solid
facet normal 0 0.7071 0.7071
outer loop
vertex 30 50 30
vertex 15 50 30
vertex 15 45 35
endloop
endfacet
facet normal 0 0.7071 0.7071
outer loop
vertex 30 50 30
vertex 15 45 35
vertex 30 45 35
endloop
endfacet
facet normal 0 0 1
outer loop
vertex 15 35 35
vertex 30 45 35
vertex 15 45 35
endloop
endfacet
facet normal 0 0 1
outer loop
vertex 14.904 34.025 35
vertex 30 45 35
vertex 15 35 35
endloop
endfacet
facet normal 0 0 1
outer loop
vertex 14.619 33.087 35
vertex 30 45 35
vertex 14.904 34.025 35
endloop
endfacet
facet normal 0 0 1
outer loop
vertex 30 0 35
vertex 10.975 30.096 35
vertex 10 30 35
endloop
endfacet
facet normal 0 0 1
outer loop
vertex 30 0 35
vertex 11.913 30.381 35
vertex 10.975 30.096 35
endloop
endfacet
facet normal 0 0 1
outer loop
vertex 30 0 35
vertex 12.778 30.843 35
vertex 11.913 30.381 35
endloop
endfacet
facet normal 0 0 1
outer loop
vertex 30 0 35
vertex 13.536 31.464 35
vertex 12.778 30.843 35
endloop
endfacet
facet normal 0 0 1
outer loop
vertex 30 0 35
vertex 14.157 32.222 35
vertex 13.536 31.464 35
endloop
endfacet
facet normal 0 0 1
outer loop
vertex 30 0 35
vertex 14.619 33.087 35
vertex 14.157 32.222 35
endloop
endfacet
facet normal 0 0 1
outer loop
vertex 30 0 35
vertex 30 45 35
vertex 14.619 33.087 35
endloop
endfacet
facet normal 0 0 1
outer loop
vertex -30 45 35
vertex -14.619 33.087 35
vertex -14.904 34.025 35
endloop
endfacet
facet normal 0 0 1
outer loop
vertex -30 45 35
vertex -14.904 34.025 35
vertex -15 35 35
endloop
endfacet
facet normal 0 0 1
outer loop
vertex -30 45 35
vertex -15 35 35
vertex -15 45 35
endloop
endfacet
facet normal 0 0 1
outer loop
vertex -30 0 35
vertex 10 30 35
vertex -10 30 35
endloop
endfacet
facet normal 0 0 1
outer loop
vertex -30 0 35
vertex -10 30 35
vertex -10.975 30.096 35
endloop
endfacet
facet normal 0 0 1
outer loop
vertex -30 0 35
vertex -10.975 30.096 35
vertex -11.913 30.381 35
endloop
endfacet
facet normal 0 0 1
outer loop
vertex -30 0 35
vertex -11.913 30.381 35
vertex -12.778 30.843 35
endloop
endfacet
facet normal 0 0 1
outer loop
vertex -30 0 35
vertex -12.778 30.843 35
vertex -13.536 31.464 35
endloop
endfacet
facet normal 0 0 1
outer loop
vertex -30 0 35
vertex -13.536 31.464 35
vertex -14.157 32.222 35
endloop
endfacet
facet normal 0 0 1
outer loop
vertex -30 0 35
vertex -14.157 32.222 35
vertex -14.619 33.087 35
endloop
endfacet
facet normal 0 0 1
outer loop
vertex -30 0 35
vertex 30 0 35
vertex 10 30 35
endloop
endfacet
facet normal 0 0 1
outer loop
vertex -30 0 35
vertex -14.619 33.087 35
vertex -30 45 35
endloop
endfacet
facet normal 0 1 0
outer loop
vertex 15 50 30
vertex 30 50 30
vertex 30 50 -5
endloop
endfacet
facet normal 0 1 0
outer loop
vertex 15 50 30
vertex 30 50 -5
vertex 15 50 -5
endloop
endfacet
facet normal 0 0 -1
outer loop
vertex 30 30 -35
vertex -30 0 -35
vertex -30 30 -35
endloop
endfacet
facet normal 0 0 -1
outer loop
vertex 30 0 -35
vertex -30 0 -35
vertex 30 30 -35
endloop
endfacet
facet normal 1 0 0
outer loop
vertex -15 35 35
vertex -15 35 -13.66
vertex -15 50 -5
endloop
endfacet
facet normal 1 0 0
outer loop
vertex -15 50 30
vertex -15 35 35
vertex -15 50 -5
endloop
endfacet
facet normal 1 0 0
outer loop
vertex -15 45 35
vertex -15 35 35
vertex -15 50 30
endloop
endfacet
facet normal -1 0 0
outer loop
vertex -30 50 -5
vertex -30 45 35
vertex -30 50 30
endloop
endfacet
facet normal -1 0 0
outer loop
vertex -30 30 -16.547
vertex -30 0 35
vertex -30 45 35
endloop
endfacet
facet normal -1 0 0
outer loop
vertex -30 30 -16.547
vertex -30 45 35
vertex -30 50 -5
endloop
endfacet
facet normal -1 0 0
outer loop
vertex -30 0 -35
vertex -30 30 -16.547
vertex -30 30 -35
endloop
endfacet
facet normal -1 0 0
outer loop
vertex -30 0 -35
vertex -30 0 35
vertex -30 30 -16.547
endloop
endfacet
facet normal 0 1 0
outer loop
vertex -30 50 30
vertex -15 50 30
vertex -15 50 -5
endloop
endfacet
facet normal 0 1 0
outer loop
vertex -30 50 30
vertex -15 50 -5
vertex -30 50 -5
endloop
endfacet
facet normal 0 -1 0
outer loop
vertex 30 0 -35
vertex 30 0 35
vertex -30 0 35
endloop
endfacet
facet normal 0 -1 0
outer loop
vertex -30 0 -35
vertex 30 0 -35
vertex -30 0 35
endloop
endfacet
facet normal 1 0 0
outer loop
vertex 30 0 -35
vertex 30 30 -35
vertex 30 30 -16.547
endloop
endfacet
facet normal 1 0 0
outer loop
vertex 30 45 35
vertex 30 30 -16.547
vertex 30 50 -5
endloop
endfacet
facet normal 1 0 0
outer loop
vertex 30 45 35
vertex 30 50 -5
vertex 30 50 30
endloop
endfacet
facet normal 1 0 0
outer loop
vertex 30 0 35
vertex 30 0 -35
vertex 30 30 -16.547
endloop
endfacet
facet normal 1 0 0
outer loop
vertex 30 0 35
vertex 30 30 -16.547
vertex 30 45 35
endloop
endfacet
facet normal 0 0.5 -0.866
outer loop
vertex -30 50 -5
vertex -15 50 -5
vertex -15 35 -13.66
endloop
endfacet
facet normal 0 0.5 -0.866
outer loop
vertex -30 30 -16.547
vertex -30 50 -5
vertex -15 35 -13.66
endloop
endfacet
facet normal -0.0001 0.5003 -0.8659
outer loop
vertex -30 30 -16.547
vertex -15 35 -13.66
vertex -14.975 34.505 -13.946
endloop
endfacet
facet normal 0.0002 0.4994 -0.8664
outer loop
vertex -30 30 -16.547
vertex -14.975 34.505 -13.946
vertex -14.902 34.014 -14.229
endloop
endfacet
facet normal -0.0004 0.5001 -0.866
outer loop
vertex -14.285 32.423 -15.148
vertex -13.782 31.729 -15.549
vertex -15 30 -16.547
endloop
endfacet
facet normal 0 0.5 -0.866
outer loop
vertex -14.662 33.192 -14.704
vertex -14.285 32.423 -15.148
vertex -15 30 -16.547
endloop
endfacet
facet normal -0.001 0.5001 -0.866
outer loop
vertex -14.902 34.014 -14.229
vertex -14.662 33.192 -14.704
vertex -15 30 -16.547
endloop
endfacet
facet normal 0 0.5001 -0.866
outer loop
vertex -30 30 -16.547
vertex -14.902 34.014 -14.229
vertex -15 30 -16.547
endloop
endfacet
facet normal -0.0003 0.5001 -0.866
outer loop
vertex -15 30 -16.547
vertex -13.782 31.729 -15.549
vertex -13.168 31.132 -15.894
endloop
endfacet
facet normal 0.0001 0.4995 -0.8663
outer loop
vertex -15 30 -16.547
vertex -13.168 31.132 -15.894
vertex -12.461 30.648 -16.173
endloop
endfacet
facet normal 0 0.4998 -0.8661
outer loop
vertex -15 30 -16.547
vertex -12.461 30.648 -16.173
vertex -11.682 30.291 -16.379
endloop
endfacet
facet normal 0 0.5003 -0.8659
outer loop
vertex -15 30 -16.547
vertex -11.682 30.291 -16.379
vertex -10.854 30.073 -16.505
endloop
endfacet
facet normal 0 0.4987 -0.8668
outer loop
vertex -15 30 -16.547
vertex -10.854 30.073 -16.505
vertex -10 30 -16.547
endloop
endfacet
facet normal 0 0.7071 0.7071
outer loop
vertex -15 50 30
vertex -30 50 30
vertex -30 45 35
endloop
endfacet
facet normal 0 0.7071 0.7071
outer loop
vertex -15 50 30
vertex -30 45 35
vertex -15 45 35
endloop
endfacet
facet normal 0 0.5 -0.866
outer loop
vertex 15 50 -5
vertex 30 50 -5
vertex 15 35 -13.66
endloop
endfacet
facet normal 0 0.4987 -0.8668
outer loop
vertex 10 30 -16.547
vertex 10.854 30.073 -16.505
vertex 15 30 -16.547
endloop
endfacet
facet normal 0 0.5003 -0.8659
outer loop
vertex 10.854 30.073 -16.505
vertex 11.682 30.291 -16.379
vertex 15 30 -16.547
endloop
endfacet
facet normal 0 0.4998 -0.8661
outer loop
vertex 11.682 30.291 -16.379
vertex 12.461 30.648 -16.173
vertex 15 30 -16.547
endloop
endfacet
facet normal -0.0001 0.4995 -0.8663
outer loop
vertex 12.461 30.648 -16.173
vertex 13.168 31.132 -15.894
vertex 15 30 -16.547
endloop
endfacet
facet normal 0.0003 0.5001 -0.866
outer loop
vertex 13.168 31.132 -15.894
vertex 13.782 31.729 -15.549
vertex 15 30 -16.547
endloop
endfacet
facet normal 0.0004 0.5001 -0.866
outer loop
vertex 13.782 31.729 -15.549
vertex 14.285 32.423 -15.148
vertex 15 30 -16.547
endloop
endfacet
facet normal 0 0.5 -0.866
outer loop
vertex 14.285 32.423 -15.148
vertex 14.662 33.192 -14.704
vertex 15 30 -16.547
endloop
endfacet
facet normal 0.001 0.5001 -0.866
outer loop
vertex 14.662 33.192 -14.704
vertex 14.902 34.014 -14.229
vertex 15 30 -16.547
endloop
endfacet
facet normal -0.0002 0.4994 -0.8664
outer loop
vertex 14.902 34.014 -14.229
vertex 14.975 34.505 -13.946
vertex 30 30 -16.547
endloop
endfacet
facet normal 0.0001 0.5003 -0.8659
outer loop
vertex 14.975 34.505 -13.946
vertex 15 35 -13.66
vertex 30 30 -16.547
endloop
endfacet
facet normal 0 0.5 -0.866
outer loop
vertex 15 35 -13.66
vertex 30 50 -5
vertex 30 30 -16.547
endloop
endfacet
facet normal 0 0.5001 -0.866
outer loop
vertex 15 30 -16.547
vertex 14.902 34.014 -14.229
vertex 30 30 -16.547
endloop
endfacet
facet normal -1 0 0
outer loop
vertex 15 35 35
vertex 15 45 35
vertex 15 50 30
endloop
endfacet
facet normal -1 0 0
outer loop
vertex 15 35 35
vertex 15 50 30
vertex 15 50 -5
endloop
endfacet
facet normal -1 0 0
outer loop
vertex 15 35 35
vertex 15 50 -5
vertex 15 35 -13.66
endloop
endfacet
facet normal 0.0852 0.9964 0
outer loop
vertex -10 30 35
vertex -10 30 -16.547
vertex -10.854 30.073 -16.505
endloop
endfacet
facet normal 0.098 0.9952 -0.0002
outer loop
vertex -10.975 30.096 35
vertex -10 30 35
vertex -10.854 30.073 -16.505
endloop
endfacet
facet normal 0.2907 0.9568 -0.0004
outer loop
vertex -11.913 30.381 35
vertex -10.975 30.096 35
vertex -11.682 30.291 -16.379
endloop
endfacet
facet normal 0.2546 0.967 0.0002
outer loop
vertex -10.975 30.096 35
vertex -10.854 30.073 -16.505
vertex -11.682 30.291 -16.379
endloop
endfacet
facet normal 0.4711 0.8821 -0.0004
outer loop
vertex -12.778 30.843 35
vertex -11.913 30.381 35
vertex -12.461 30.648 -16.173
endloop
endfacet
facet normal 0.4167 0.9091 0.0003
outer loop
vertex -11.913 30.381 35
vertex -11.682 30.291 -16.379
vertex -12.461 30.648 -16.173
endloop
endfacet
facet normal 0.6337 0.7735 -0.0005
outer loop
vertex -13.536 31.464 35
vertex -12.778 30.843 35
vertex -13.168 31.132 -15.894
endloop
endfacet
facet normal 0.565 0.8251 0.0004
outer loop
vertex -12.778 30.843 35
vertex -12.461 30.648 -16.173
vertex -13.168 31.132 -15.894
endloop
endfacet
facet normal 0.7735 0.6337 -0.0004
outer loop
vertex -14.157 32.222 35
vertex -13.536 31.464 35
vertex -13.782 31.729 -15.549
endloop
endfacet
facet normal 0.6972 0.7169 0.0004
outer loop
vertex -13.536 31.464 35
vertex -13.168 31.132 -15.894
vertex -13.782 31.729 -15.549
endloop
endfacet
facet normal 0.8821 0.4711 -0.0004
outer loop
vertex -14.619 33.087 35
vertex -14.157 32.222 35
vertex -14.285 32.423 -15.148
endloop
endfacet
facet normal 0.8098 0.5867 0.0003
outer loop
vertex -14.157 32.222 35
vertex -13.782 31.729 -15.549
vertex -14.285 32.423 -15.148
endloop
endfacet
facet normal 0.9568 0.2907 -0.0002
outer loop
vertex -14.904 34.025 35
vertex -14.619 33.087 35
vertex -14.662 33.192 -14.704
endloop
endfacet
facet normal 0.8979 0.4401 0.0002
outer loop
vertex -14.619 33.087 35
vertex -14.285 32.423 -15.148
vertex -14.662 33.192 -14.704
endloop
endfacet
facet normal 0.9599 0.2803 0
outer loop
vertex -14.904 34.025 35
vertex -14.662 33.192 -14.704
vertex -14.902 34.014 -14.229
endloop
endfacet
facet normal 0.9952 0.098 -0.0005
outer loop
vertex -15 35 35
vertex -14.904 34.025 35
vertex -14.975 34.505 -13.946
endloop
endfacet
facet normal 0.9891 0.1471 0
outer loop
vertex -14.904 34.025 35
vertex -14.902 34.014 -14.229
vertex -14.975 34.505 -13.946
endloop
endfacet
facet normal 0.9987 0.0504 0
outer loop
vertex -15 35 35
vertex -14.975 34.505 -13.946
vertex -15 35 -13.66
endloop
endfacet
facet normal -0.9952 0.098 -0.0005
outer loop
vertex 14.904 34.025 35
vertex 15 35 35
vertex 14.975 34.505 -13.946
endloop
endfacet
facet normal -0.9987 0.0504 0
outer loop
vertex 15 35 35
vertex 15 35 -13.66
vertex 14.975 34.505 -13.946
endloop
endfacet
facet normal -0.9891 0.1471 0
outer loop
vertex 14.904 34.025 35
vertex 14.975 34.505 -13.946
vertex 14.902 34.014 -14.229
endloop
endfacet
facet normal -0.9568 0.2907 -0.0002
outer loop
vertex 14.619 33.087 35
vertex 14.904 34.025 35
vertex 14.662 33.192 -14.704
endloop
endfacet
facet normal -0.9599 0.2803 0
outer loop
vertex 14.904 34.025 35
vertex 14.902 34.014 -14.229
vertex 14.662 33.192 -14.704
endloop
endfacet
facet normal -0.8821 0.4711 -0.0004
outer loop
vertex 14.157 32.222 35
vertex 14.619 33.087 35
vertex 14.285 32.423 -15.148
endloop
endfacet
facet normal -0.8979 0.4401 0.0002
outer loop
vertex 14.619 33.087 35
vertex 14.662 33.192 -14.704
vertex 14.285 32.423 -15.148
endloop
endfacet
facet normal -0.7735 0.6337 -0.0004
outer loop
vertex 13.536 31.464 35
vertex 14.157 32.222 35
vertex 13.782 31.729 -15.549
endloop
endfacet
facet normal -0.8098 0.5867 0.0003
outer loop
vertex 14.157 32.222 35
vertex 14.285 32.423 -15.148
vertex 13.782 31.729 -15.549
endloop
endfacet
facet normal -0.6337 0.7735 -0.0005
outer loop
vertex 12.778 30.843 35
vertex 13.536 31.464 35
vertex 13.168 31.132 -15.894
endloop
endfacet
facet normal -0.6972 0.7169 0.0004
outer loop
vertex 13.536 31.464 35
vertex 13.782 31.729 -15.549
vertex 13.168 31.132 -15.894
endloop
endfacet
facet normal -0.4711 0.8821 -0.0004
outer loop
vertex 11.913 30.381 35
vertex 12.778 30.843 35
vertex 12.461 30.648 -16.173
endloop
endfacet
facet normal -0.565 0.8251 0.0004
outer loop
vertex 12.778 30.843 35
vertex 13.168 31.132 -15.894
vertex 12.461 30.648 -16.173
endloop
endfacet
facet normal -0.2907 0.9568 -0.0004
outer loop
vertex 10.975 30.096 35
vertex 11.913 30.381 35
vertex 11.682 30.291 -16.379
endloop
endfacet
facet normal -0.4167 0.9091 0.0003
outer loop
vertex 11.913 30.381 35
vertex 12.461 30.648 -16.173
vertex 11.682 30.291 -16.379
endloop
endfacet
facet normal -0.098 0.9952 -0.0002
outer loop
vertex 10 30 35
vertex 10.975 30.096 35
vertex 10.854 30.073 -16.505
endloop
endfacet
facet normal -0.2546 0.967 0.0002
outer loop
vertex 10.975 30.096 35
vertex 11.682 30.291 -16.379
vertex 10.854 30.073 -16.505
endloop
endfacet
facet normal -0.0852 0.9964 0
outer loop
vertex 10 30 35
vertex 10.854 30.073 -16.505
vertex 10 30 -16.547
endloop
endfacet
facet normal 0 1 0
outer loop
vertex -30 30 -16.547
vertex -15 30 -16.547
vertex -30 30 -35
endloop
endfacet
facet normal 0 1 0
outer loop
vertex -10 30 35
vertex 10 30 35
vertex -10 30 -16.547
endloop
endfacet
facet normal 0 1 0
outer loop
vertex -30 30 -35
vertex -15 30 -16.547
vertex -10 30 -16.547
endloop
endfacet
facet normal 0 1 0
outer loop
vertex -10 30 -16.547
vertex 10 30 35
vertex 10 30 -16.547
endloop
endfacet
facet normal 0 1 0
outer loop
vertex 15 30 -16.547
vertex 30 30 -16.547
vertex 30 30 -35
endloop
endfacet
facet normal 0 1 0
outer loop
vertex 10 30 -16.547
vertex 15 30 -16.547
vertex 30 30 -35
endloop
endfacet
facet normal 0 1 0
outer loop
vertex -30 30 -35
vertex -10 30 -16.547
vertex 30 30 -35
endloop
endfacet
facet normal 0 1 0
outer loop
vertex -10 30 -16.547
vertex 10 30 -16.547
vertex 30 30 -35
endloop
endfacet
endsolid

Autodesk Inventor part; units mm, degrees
ref_plane "YZ Plane" through (0, 0, 0) normal (1, 0, 0) x (0, 1, 0)
ref_plane "XZ Plane" through (0, 0, 0) normal (0, 1, 0) x (-1, 0, 0)
ref_plane "XY Plane" through (0, 0, 0) normal (0, 0, 1) x (1, 0, 0)
sketch "Esboço1" plane through (0, 0, 0) normal (0, 1, 0) x (-1, 0, 0)
  line L0 (30, -35) -> (-30, -35)
  line L1 (-30, -35) -> (-30, 35)
  line L2 (-30, 35) -> (30, 35)
  line L3 (30, 35) -> (30, -35)
  line L4 (30, -35) -> (-30, 35) construction
  line L5 (-30, -35) -> (30, 35) construction
  point P0 (0, 0)
  dimension "d0" = 60
  dimension "d1" = 70
extrude "Extrusão1" add sketch "Esboço1" along normal blind 50
sketch "Esboço3" plane through (30, 0, 35) normal (1, 0, 0) x (0, 0, -1)
  line L0 (0, 50) -> (70, 50) projected
  line L1 (40, 50) -> (51.547, 30)
  line L2 (51.547, 30) -> (70, 30)
  line L3 (40, 50) -> (70, 50)
  line L4 (70, 0) -> (70, 50) projected
  line L5 (70, 30) -> (70, 50)
  point P0 (35, 0)
  dimension "d6" = 20
  dimension "d7" = 30
  dimension "d8" = 60
extrude "Extrusão2" cut sketch "Esboço3" against normal through all
sketch "Esboço4" plane through (-30, 0, 35) normal (0, 0, 1) x (1, 0, 0)
  line L0 (15, 50) -> (45, 50)
  line L1 (45, 50) -> (45, 30)
  line L2 (45, 30) -> (15, 30)
  line L3 (15, 30) -> (15, 50)
  line L4 (0, 50) -> (60, 50) projected
  point P0 (30, 0)
  point P1 (30, 50)
  dimension "d11" = 30
  dimension "d12" = 20
extrude "Extrusão3" cut sketch "Esboço4" against normal through all
fillet "Arredondamento1" radius 5 2 edges at (-15, 30, 9.2265) (15, 30, 9.2265)
chamfer "Chanfro1" distance 5 angle 45 2 edges at (-22.5, 50, 35) (22.5, 50, 35)
properties part number "3D Model"
